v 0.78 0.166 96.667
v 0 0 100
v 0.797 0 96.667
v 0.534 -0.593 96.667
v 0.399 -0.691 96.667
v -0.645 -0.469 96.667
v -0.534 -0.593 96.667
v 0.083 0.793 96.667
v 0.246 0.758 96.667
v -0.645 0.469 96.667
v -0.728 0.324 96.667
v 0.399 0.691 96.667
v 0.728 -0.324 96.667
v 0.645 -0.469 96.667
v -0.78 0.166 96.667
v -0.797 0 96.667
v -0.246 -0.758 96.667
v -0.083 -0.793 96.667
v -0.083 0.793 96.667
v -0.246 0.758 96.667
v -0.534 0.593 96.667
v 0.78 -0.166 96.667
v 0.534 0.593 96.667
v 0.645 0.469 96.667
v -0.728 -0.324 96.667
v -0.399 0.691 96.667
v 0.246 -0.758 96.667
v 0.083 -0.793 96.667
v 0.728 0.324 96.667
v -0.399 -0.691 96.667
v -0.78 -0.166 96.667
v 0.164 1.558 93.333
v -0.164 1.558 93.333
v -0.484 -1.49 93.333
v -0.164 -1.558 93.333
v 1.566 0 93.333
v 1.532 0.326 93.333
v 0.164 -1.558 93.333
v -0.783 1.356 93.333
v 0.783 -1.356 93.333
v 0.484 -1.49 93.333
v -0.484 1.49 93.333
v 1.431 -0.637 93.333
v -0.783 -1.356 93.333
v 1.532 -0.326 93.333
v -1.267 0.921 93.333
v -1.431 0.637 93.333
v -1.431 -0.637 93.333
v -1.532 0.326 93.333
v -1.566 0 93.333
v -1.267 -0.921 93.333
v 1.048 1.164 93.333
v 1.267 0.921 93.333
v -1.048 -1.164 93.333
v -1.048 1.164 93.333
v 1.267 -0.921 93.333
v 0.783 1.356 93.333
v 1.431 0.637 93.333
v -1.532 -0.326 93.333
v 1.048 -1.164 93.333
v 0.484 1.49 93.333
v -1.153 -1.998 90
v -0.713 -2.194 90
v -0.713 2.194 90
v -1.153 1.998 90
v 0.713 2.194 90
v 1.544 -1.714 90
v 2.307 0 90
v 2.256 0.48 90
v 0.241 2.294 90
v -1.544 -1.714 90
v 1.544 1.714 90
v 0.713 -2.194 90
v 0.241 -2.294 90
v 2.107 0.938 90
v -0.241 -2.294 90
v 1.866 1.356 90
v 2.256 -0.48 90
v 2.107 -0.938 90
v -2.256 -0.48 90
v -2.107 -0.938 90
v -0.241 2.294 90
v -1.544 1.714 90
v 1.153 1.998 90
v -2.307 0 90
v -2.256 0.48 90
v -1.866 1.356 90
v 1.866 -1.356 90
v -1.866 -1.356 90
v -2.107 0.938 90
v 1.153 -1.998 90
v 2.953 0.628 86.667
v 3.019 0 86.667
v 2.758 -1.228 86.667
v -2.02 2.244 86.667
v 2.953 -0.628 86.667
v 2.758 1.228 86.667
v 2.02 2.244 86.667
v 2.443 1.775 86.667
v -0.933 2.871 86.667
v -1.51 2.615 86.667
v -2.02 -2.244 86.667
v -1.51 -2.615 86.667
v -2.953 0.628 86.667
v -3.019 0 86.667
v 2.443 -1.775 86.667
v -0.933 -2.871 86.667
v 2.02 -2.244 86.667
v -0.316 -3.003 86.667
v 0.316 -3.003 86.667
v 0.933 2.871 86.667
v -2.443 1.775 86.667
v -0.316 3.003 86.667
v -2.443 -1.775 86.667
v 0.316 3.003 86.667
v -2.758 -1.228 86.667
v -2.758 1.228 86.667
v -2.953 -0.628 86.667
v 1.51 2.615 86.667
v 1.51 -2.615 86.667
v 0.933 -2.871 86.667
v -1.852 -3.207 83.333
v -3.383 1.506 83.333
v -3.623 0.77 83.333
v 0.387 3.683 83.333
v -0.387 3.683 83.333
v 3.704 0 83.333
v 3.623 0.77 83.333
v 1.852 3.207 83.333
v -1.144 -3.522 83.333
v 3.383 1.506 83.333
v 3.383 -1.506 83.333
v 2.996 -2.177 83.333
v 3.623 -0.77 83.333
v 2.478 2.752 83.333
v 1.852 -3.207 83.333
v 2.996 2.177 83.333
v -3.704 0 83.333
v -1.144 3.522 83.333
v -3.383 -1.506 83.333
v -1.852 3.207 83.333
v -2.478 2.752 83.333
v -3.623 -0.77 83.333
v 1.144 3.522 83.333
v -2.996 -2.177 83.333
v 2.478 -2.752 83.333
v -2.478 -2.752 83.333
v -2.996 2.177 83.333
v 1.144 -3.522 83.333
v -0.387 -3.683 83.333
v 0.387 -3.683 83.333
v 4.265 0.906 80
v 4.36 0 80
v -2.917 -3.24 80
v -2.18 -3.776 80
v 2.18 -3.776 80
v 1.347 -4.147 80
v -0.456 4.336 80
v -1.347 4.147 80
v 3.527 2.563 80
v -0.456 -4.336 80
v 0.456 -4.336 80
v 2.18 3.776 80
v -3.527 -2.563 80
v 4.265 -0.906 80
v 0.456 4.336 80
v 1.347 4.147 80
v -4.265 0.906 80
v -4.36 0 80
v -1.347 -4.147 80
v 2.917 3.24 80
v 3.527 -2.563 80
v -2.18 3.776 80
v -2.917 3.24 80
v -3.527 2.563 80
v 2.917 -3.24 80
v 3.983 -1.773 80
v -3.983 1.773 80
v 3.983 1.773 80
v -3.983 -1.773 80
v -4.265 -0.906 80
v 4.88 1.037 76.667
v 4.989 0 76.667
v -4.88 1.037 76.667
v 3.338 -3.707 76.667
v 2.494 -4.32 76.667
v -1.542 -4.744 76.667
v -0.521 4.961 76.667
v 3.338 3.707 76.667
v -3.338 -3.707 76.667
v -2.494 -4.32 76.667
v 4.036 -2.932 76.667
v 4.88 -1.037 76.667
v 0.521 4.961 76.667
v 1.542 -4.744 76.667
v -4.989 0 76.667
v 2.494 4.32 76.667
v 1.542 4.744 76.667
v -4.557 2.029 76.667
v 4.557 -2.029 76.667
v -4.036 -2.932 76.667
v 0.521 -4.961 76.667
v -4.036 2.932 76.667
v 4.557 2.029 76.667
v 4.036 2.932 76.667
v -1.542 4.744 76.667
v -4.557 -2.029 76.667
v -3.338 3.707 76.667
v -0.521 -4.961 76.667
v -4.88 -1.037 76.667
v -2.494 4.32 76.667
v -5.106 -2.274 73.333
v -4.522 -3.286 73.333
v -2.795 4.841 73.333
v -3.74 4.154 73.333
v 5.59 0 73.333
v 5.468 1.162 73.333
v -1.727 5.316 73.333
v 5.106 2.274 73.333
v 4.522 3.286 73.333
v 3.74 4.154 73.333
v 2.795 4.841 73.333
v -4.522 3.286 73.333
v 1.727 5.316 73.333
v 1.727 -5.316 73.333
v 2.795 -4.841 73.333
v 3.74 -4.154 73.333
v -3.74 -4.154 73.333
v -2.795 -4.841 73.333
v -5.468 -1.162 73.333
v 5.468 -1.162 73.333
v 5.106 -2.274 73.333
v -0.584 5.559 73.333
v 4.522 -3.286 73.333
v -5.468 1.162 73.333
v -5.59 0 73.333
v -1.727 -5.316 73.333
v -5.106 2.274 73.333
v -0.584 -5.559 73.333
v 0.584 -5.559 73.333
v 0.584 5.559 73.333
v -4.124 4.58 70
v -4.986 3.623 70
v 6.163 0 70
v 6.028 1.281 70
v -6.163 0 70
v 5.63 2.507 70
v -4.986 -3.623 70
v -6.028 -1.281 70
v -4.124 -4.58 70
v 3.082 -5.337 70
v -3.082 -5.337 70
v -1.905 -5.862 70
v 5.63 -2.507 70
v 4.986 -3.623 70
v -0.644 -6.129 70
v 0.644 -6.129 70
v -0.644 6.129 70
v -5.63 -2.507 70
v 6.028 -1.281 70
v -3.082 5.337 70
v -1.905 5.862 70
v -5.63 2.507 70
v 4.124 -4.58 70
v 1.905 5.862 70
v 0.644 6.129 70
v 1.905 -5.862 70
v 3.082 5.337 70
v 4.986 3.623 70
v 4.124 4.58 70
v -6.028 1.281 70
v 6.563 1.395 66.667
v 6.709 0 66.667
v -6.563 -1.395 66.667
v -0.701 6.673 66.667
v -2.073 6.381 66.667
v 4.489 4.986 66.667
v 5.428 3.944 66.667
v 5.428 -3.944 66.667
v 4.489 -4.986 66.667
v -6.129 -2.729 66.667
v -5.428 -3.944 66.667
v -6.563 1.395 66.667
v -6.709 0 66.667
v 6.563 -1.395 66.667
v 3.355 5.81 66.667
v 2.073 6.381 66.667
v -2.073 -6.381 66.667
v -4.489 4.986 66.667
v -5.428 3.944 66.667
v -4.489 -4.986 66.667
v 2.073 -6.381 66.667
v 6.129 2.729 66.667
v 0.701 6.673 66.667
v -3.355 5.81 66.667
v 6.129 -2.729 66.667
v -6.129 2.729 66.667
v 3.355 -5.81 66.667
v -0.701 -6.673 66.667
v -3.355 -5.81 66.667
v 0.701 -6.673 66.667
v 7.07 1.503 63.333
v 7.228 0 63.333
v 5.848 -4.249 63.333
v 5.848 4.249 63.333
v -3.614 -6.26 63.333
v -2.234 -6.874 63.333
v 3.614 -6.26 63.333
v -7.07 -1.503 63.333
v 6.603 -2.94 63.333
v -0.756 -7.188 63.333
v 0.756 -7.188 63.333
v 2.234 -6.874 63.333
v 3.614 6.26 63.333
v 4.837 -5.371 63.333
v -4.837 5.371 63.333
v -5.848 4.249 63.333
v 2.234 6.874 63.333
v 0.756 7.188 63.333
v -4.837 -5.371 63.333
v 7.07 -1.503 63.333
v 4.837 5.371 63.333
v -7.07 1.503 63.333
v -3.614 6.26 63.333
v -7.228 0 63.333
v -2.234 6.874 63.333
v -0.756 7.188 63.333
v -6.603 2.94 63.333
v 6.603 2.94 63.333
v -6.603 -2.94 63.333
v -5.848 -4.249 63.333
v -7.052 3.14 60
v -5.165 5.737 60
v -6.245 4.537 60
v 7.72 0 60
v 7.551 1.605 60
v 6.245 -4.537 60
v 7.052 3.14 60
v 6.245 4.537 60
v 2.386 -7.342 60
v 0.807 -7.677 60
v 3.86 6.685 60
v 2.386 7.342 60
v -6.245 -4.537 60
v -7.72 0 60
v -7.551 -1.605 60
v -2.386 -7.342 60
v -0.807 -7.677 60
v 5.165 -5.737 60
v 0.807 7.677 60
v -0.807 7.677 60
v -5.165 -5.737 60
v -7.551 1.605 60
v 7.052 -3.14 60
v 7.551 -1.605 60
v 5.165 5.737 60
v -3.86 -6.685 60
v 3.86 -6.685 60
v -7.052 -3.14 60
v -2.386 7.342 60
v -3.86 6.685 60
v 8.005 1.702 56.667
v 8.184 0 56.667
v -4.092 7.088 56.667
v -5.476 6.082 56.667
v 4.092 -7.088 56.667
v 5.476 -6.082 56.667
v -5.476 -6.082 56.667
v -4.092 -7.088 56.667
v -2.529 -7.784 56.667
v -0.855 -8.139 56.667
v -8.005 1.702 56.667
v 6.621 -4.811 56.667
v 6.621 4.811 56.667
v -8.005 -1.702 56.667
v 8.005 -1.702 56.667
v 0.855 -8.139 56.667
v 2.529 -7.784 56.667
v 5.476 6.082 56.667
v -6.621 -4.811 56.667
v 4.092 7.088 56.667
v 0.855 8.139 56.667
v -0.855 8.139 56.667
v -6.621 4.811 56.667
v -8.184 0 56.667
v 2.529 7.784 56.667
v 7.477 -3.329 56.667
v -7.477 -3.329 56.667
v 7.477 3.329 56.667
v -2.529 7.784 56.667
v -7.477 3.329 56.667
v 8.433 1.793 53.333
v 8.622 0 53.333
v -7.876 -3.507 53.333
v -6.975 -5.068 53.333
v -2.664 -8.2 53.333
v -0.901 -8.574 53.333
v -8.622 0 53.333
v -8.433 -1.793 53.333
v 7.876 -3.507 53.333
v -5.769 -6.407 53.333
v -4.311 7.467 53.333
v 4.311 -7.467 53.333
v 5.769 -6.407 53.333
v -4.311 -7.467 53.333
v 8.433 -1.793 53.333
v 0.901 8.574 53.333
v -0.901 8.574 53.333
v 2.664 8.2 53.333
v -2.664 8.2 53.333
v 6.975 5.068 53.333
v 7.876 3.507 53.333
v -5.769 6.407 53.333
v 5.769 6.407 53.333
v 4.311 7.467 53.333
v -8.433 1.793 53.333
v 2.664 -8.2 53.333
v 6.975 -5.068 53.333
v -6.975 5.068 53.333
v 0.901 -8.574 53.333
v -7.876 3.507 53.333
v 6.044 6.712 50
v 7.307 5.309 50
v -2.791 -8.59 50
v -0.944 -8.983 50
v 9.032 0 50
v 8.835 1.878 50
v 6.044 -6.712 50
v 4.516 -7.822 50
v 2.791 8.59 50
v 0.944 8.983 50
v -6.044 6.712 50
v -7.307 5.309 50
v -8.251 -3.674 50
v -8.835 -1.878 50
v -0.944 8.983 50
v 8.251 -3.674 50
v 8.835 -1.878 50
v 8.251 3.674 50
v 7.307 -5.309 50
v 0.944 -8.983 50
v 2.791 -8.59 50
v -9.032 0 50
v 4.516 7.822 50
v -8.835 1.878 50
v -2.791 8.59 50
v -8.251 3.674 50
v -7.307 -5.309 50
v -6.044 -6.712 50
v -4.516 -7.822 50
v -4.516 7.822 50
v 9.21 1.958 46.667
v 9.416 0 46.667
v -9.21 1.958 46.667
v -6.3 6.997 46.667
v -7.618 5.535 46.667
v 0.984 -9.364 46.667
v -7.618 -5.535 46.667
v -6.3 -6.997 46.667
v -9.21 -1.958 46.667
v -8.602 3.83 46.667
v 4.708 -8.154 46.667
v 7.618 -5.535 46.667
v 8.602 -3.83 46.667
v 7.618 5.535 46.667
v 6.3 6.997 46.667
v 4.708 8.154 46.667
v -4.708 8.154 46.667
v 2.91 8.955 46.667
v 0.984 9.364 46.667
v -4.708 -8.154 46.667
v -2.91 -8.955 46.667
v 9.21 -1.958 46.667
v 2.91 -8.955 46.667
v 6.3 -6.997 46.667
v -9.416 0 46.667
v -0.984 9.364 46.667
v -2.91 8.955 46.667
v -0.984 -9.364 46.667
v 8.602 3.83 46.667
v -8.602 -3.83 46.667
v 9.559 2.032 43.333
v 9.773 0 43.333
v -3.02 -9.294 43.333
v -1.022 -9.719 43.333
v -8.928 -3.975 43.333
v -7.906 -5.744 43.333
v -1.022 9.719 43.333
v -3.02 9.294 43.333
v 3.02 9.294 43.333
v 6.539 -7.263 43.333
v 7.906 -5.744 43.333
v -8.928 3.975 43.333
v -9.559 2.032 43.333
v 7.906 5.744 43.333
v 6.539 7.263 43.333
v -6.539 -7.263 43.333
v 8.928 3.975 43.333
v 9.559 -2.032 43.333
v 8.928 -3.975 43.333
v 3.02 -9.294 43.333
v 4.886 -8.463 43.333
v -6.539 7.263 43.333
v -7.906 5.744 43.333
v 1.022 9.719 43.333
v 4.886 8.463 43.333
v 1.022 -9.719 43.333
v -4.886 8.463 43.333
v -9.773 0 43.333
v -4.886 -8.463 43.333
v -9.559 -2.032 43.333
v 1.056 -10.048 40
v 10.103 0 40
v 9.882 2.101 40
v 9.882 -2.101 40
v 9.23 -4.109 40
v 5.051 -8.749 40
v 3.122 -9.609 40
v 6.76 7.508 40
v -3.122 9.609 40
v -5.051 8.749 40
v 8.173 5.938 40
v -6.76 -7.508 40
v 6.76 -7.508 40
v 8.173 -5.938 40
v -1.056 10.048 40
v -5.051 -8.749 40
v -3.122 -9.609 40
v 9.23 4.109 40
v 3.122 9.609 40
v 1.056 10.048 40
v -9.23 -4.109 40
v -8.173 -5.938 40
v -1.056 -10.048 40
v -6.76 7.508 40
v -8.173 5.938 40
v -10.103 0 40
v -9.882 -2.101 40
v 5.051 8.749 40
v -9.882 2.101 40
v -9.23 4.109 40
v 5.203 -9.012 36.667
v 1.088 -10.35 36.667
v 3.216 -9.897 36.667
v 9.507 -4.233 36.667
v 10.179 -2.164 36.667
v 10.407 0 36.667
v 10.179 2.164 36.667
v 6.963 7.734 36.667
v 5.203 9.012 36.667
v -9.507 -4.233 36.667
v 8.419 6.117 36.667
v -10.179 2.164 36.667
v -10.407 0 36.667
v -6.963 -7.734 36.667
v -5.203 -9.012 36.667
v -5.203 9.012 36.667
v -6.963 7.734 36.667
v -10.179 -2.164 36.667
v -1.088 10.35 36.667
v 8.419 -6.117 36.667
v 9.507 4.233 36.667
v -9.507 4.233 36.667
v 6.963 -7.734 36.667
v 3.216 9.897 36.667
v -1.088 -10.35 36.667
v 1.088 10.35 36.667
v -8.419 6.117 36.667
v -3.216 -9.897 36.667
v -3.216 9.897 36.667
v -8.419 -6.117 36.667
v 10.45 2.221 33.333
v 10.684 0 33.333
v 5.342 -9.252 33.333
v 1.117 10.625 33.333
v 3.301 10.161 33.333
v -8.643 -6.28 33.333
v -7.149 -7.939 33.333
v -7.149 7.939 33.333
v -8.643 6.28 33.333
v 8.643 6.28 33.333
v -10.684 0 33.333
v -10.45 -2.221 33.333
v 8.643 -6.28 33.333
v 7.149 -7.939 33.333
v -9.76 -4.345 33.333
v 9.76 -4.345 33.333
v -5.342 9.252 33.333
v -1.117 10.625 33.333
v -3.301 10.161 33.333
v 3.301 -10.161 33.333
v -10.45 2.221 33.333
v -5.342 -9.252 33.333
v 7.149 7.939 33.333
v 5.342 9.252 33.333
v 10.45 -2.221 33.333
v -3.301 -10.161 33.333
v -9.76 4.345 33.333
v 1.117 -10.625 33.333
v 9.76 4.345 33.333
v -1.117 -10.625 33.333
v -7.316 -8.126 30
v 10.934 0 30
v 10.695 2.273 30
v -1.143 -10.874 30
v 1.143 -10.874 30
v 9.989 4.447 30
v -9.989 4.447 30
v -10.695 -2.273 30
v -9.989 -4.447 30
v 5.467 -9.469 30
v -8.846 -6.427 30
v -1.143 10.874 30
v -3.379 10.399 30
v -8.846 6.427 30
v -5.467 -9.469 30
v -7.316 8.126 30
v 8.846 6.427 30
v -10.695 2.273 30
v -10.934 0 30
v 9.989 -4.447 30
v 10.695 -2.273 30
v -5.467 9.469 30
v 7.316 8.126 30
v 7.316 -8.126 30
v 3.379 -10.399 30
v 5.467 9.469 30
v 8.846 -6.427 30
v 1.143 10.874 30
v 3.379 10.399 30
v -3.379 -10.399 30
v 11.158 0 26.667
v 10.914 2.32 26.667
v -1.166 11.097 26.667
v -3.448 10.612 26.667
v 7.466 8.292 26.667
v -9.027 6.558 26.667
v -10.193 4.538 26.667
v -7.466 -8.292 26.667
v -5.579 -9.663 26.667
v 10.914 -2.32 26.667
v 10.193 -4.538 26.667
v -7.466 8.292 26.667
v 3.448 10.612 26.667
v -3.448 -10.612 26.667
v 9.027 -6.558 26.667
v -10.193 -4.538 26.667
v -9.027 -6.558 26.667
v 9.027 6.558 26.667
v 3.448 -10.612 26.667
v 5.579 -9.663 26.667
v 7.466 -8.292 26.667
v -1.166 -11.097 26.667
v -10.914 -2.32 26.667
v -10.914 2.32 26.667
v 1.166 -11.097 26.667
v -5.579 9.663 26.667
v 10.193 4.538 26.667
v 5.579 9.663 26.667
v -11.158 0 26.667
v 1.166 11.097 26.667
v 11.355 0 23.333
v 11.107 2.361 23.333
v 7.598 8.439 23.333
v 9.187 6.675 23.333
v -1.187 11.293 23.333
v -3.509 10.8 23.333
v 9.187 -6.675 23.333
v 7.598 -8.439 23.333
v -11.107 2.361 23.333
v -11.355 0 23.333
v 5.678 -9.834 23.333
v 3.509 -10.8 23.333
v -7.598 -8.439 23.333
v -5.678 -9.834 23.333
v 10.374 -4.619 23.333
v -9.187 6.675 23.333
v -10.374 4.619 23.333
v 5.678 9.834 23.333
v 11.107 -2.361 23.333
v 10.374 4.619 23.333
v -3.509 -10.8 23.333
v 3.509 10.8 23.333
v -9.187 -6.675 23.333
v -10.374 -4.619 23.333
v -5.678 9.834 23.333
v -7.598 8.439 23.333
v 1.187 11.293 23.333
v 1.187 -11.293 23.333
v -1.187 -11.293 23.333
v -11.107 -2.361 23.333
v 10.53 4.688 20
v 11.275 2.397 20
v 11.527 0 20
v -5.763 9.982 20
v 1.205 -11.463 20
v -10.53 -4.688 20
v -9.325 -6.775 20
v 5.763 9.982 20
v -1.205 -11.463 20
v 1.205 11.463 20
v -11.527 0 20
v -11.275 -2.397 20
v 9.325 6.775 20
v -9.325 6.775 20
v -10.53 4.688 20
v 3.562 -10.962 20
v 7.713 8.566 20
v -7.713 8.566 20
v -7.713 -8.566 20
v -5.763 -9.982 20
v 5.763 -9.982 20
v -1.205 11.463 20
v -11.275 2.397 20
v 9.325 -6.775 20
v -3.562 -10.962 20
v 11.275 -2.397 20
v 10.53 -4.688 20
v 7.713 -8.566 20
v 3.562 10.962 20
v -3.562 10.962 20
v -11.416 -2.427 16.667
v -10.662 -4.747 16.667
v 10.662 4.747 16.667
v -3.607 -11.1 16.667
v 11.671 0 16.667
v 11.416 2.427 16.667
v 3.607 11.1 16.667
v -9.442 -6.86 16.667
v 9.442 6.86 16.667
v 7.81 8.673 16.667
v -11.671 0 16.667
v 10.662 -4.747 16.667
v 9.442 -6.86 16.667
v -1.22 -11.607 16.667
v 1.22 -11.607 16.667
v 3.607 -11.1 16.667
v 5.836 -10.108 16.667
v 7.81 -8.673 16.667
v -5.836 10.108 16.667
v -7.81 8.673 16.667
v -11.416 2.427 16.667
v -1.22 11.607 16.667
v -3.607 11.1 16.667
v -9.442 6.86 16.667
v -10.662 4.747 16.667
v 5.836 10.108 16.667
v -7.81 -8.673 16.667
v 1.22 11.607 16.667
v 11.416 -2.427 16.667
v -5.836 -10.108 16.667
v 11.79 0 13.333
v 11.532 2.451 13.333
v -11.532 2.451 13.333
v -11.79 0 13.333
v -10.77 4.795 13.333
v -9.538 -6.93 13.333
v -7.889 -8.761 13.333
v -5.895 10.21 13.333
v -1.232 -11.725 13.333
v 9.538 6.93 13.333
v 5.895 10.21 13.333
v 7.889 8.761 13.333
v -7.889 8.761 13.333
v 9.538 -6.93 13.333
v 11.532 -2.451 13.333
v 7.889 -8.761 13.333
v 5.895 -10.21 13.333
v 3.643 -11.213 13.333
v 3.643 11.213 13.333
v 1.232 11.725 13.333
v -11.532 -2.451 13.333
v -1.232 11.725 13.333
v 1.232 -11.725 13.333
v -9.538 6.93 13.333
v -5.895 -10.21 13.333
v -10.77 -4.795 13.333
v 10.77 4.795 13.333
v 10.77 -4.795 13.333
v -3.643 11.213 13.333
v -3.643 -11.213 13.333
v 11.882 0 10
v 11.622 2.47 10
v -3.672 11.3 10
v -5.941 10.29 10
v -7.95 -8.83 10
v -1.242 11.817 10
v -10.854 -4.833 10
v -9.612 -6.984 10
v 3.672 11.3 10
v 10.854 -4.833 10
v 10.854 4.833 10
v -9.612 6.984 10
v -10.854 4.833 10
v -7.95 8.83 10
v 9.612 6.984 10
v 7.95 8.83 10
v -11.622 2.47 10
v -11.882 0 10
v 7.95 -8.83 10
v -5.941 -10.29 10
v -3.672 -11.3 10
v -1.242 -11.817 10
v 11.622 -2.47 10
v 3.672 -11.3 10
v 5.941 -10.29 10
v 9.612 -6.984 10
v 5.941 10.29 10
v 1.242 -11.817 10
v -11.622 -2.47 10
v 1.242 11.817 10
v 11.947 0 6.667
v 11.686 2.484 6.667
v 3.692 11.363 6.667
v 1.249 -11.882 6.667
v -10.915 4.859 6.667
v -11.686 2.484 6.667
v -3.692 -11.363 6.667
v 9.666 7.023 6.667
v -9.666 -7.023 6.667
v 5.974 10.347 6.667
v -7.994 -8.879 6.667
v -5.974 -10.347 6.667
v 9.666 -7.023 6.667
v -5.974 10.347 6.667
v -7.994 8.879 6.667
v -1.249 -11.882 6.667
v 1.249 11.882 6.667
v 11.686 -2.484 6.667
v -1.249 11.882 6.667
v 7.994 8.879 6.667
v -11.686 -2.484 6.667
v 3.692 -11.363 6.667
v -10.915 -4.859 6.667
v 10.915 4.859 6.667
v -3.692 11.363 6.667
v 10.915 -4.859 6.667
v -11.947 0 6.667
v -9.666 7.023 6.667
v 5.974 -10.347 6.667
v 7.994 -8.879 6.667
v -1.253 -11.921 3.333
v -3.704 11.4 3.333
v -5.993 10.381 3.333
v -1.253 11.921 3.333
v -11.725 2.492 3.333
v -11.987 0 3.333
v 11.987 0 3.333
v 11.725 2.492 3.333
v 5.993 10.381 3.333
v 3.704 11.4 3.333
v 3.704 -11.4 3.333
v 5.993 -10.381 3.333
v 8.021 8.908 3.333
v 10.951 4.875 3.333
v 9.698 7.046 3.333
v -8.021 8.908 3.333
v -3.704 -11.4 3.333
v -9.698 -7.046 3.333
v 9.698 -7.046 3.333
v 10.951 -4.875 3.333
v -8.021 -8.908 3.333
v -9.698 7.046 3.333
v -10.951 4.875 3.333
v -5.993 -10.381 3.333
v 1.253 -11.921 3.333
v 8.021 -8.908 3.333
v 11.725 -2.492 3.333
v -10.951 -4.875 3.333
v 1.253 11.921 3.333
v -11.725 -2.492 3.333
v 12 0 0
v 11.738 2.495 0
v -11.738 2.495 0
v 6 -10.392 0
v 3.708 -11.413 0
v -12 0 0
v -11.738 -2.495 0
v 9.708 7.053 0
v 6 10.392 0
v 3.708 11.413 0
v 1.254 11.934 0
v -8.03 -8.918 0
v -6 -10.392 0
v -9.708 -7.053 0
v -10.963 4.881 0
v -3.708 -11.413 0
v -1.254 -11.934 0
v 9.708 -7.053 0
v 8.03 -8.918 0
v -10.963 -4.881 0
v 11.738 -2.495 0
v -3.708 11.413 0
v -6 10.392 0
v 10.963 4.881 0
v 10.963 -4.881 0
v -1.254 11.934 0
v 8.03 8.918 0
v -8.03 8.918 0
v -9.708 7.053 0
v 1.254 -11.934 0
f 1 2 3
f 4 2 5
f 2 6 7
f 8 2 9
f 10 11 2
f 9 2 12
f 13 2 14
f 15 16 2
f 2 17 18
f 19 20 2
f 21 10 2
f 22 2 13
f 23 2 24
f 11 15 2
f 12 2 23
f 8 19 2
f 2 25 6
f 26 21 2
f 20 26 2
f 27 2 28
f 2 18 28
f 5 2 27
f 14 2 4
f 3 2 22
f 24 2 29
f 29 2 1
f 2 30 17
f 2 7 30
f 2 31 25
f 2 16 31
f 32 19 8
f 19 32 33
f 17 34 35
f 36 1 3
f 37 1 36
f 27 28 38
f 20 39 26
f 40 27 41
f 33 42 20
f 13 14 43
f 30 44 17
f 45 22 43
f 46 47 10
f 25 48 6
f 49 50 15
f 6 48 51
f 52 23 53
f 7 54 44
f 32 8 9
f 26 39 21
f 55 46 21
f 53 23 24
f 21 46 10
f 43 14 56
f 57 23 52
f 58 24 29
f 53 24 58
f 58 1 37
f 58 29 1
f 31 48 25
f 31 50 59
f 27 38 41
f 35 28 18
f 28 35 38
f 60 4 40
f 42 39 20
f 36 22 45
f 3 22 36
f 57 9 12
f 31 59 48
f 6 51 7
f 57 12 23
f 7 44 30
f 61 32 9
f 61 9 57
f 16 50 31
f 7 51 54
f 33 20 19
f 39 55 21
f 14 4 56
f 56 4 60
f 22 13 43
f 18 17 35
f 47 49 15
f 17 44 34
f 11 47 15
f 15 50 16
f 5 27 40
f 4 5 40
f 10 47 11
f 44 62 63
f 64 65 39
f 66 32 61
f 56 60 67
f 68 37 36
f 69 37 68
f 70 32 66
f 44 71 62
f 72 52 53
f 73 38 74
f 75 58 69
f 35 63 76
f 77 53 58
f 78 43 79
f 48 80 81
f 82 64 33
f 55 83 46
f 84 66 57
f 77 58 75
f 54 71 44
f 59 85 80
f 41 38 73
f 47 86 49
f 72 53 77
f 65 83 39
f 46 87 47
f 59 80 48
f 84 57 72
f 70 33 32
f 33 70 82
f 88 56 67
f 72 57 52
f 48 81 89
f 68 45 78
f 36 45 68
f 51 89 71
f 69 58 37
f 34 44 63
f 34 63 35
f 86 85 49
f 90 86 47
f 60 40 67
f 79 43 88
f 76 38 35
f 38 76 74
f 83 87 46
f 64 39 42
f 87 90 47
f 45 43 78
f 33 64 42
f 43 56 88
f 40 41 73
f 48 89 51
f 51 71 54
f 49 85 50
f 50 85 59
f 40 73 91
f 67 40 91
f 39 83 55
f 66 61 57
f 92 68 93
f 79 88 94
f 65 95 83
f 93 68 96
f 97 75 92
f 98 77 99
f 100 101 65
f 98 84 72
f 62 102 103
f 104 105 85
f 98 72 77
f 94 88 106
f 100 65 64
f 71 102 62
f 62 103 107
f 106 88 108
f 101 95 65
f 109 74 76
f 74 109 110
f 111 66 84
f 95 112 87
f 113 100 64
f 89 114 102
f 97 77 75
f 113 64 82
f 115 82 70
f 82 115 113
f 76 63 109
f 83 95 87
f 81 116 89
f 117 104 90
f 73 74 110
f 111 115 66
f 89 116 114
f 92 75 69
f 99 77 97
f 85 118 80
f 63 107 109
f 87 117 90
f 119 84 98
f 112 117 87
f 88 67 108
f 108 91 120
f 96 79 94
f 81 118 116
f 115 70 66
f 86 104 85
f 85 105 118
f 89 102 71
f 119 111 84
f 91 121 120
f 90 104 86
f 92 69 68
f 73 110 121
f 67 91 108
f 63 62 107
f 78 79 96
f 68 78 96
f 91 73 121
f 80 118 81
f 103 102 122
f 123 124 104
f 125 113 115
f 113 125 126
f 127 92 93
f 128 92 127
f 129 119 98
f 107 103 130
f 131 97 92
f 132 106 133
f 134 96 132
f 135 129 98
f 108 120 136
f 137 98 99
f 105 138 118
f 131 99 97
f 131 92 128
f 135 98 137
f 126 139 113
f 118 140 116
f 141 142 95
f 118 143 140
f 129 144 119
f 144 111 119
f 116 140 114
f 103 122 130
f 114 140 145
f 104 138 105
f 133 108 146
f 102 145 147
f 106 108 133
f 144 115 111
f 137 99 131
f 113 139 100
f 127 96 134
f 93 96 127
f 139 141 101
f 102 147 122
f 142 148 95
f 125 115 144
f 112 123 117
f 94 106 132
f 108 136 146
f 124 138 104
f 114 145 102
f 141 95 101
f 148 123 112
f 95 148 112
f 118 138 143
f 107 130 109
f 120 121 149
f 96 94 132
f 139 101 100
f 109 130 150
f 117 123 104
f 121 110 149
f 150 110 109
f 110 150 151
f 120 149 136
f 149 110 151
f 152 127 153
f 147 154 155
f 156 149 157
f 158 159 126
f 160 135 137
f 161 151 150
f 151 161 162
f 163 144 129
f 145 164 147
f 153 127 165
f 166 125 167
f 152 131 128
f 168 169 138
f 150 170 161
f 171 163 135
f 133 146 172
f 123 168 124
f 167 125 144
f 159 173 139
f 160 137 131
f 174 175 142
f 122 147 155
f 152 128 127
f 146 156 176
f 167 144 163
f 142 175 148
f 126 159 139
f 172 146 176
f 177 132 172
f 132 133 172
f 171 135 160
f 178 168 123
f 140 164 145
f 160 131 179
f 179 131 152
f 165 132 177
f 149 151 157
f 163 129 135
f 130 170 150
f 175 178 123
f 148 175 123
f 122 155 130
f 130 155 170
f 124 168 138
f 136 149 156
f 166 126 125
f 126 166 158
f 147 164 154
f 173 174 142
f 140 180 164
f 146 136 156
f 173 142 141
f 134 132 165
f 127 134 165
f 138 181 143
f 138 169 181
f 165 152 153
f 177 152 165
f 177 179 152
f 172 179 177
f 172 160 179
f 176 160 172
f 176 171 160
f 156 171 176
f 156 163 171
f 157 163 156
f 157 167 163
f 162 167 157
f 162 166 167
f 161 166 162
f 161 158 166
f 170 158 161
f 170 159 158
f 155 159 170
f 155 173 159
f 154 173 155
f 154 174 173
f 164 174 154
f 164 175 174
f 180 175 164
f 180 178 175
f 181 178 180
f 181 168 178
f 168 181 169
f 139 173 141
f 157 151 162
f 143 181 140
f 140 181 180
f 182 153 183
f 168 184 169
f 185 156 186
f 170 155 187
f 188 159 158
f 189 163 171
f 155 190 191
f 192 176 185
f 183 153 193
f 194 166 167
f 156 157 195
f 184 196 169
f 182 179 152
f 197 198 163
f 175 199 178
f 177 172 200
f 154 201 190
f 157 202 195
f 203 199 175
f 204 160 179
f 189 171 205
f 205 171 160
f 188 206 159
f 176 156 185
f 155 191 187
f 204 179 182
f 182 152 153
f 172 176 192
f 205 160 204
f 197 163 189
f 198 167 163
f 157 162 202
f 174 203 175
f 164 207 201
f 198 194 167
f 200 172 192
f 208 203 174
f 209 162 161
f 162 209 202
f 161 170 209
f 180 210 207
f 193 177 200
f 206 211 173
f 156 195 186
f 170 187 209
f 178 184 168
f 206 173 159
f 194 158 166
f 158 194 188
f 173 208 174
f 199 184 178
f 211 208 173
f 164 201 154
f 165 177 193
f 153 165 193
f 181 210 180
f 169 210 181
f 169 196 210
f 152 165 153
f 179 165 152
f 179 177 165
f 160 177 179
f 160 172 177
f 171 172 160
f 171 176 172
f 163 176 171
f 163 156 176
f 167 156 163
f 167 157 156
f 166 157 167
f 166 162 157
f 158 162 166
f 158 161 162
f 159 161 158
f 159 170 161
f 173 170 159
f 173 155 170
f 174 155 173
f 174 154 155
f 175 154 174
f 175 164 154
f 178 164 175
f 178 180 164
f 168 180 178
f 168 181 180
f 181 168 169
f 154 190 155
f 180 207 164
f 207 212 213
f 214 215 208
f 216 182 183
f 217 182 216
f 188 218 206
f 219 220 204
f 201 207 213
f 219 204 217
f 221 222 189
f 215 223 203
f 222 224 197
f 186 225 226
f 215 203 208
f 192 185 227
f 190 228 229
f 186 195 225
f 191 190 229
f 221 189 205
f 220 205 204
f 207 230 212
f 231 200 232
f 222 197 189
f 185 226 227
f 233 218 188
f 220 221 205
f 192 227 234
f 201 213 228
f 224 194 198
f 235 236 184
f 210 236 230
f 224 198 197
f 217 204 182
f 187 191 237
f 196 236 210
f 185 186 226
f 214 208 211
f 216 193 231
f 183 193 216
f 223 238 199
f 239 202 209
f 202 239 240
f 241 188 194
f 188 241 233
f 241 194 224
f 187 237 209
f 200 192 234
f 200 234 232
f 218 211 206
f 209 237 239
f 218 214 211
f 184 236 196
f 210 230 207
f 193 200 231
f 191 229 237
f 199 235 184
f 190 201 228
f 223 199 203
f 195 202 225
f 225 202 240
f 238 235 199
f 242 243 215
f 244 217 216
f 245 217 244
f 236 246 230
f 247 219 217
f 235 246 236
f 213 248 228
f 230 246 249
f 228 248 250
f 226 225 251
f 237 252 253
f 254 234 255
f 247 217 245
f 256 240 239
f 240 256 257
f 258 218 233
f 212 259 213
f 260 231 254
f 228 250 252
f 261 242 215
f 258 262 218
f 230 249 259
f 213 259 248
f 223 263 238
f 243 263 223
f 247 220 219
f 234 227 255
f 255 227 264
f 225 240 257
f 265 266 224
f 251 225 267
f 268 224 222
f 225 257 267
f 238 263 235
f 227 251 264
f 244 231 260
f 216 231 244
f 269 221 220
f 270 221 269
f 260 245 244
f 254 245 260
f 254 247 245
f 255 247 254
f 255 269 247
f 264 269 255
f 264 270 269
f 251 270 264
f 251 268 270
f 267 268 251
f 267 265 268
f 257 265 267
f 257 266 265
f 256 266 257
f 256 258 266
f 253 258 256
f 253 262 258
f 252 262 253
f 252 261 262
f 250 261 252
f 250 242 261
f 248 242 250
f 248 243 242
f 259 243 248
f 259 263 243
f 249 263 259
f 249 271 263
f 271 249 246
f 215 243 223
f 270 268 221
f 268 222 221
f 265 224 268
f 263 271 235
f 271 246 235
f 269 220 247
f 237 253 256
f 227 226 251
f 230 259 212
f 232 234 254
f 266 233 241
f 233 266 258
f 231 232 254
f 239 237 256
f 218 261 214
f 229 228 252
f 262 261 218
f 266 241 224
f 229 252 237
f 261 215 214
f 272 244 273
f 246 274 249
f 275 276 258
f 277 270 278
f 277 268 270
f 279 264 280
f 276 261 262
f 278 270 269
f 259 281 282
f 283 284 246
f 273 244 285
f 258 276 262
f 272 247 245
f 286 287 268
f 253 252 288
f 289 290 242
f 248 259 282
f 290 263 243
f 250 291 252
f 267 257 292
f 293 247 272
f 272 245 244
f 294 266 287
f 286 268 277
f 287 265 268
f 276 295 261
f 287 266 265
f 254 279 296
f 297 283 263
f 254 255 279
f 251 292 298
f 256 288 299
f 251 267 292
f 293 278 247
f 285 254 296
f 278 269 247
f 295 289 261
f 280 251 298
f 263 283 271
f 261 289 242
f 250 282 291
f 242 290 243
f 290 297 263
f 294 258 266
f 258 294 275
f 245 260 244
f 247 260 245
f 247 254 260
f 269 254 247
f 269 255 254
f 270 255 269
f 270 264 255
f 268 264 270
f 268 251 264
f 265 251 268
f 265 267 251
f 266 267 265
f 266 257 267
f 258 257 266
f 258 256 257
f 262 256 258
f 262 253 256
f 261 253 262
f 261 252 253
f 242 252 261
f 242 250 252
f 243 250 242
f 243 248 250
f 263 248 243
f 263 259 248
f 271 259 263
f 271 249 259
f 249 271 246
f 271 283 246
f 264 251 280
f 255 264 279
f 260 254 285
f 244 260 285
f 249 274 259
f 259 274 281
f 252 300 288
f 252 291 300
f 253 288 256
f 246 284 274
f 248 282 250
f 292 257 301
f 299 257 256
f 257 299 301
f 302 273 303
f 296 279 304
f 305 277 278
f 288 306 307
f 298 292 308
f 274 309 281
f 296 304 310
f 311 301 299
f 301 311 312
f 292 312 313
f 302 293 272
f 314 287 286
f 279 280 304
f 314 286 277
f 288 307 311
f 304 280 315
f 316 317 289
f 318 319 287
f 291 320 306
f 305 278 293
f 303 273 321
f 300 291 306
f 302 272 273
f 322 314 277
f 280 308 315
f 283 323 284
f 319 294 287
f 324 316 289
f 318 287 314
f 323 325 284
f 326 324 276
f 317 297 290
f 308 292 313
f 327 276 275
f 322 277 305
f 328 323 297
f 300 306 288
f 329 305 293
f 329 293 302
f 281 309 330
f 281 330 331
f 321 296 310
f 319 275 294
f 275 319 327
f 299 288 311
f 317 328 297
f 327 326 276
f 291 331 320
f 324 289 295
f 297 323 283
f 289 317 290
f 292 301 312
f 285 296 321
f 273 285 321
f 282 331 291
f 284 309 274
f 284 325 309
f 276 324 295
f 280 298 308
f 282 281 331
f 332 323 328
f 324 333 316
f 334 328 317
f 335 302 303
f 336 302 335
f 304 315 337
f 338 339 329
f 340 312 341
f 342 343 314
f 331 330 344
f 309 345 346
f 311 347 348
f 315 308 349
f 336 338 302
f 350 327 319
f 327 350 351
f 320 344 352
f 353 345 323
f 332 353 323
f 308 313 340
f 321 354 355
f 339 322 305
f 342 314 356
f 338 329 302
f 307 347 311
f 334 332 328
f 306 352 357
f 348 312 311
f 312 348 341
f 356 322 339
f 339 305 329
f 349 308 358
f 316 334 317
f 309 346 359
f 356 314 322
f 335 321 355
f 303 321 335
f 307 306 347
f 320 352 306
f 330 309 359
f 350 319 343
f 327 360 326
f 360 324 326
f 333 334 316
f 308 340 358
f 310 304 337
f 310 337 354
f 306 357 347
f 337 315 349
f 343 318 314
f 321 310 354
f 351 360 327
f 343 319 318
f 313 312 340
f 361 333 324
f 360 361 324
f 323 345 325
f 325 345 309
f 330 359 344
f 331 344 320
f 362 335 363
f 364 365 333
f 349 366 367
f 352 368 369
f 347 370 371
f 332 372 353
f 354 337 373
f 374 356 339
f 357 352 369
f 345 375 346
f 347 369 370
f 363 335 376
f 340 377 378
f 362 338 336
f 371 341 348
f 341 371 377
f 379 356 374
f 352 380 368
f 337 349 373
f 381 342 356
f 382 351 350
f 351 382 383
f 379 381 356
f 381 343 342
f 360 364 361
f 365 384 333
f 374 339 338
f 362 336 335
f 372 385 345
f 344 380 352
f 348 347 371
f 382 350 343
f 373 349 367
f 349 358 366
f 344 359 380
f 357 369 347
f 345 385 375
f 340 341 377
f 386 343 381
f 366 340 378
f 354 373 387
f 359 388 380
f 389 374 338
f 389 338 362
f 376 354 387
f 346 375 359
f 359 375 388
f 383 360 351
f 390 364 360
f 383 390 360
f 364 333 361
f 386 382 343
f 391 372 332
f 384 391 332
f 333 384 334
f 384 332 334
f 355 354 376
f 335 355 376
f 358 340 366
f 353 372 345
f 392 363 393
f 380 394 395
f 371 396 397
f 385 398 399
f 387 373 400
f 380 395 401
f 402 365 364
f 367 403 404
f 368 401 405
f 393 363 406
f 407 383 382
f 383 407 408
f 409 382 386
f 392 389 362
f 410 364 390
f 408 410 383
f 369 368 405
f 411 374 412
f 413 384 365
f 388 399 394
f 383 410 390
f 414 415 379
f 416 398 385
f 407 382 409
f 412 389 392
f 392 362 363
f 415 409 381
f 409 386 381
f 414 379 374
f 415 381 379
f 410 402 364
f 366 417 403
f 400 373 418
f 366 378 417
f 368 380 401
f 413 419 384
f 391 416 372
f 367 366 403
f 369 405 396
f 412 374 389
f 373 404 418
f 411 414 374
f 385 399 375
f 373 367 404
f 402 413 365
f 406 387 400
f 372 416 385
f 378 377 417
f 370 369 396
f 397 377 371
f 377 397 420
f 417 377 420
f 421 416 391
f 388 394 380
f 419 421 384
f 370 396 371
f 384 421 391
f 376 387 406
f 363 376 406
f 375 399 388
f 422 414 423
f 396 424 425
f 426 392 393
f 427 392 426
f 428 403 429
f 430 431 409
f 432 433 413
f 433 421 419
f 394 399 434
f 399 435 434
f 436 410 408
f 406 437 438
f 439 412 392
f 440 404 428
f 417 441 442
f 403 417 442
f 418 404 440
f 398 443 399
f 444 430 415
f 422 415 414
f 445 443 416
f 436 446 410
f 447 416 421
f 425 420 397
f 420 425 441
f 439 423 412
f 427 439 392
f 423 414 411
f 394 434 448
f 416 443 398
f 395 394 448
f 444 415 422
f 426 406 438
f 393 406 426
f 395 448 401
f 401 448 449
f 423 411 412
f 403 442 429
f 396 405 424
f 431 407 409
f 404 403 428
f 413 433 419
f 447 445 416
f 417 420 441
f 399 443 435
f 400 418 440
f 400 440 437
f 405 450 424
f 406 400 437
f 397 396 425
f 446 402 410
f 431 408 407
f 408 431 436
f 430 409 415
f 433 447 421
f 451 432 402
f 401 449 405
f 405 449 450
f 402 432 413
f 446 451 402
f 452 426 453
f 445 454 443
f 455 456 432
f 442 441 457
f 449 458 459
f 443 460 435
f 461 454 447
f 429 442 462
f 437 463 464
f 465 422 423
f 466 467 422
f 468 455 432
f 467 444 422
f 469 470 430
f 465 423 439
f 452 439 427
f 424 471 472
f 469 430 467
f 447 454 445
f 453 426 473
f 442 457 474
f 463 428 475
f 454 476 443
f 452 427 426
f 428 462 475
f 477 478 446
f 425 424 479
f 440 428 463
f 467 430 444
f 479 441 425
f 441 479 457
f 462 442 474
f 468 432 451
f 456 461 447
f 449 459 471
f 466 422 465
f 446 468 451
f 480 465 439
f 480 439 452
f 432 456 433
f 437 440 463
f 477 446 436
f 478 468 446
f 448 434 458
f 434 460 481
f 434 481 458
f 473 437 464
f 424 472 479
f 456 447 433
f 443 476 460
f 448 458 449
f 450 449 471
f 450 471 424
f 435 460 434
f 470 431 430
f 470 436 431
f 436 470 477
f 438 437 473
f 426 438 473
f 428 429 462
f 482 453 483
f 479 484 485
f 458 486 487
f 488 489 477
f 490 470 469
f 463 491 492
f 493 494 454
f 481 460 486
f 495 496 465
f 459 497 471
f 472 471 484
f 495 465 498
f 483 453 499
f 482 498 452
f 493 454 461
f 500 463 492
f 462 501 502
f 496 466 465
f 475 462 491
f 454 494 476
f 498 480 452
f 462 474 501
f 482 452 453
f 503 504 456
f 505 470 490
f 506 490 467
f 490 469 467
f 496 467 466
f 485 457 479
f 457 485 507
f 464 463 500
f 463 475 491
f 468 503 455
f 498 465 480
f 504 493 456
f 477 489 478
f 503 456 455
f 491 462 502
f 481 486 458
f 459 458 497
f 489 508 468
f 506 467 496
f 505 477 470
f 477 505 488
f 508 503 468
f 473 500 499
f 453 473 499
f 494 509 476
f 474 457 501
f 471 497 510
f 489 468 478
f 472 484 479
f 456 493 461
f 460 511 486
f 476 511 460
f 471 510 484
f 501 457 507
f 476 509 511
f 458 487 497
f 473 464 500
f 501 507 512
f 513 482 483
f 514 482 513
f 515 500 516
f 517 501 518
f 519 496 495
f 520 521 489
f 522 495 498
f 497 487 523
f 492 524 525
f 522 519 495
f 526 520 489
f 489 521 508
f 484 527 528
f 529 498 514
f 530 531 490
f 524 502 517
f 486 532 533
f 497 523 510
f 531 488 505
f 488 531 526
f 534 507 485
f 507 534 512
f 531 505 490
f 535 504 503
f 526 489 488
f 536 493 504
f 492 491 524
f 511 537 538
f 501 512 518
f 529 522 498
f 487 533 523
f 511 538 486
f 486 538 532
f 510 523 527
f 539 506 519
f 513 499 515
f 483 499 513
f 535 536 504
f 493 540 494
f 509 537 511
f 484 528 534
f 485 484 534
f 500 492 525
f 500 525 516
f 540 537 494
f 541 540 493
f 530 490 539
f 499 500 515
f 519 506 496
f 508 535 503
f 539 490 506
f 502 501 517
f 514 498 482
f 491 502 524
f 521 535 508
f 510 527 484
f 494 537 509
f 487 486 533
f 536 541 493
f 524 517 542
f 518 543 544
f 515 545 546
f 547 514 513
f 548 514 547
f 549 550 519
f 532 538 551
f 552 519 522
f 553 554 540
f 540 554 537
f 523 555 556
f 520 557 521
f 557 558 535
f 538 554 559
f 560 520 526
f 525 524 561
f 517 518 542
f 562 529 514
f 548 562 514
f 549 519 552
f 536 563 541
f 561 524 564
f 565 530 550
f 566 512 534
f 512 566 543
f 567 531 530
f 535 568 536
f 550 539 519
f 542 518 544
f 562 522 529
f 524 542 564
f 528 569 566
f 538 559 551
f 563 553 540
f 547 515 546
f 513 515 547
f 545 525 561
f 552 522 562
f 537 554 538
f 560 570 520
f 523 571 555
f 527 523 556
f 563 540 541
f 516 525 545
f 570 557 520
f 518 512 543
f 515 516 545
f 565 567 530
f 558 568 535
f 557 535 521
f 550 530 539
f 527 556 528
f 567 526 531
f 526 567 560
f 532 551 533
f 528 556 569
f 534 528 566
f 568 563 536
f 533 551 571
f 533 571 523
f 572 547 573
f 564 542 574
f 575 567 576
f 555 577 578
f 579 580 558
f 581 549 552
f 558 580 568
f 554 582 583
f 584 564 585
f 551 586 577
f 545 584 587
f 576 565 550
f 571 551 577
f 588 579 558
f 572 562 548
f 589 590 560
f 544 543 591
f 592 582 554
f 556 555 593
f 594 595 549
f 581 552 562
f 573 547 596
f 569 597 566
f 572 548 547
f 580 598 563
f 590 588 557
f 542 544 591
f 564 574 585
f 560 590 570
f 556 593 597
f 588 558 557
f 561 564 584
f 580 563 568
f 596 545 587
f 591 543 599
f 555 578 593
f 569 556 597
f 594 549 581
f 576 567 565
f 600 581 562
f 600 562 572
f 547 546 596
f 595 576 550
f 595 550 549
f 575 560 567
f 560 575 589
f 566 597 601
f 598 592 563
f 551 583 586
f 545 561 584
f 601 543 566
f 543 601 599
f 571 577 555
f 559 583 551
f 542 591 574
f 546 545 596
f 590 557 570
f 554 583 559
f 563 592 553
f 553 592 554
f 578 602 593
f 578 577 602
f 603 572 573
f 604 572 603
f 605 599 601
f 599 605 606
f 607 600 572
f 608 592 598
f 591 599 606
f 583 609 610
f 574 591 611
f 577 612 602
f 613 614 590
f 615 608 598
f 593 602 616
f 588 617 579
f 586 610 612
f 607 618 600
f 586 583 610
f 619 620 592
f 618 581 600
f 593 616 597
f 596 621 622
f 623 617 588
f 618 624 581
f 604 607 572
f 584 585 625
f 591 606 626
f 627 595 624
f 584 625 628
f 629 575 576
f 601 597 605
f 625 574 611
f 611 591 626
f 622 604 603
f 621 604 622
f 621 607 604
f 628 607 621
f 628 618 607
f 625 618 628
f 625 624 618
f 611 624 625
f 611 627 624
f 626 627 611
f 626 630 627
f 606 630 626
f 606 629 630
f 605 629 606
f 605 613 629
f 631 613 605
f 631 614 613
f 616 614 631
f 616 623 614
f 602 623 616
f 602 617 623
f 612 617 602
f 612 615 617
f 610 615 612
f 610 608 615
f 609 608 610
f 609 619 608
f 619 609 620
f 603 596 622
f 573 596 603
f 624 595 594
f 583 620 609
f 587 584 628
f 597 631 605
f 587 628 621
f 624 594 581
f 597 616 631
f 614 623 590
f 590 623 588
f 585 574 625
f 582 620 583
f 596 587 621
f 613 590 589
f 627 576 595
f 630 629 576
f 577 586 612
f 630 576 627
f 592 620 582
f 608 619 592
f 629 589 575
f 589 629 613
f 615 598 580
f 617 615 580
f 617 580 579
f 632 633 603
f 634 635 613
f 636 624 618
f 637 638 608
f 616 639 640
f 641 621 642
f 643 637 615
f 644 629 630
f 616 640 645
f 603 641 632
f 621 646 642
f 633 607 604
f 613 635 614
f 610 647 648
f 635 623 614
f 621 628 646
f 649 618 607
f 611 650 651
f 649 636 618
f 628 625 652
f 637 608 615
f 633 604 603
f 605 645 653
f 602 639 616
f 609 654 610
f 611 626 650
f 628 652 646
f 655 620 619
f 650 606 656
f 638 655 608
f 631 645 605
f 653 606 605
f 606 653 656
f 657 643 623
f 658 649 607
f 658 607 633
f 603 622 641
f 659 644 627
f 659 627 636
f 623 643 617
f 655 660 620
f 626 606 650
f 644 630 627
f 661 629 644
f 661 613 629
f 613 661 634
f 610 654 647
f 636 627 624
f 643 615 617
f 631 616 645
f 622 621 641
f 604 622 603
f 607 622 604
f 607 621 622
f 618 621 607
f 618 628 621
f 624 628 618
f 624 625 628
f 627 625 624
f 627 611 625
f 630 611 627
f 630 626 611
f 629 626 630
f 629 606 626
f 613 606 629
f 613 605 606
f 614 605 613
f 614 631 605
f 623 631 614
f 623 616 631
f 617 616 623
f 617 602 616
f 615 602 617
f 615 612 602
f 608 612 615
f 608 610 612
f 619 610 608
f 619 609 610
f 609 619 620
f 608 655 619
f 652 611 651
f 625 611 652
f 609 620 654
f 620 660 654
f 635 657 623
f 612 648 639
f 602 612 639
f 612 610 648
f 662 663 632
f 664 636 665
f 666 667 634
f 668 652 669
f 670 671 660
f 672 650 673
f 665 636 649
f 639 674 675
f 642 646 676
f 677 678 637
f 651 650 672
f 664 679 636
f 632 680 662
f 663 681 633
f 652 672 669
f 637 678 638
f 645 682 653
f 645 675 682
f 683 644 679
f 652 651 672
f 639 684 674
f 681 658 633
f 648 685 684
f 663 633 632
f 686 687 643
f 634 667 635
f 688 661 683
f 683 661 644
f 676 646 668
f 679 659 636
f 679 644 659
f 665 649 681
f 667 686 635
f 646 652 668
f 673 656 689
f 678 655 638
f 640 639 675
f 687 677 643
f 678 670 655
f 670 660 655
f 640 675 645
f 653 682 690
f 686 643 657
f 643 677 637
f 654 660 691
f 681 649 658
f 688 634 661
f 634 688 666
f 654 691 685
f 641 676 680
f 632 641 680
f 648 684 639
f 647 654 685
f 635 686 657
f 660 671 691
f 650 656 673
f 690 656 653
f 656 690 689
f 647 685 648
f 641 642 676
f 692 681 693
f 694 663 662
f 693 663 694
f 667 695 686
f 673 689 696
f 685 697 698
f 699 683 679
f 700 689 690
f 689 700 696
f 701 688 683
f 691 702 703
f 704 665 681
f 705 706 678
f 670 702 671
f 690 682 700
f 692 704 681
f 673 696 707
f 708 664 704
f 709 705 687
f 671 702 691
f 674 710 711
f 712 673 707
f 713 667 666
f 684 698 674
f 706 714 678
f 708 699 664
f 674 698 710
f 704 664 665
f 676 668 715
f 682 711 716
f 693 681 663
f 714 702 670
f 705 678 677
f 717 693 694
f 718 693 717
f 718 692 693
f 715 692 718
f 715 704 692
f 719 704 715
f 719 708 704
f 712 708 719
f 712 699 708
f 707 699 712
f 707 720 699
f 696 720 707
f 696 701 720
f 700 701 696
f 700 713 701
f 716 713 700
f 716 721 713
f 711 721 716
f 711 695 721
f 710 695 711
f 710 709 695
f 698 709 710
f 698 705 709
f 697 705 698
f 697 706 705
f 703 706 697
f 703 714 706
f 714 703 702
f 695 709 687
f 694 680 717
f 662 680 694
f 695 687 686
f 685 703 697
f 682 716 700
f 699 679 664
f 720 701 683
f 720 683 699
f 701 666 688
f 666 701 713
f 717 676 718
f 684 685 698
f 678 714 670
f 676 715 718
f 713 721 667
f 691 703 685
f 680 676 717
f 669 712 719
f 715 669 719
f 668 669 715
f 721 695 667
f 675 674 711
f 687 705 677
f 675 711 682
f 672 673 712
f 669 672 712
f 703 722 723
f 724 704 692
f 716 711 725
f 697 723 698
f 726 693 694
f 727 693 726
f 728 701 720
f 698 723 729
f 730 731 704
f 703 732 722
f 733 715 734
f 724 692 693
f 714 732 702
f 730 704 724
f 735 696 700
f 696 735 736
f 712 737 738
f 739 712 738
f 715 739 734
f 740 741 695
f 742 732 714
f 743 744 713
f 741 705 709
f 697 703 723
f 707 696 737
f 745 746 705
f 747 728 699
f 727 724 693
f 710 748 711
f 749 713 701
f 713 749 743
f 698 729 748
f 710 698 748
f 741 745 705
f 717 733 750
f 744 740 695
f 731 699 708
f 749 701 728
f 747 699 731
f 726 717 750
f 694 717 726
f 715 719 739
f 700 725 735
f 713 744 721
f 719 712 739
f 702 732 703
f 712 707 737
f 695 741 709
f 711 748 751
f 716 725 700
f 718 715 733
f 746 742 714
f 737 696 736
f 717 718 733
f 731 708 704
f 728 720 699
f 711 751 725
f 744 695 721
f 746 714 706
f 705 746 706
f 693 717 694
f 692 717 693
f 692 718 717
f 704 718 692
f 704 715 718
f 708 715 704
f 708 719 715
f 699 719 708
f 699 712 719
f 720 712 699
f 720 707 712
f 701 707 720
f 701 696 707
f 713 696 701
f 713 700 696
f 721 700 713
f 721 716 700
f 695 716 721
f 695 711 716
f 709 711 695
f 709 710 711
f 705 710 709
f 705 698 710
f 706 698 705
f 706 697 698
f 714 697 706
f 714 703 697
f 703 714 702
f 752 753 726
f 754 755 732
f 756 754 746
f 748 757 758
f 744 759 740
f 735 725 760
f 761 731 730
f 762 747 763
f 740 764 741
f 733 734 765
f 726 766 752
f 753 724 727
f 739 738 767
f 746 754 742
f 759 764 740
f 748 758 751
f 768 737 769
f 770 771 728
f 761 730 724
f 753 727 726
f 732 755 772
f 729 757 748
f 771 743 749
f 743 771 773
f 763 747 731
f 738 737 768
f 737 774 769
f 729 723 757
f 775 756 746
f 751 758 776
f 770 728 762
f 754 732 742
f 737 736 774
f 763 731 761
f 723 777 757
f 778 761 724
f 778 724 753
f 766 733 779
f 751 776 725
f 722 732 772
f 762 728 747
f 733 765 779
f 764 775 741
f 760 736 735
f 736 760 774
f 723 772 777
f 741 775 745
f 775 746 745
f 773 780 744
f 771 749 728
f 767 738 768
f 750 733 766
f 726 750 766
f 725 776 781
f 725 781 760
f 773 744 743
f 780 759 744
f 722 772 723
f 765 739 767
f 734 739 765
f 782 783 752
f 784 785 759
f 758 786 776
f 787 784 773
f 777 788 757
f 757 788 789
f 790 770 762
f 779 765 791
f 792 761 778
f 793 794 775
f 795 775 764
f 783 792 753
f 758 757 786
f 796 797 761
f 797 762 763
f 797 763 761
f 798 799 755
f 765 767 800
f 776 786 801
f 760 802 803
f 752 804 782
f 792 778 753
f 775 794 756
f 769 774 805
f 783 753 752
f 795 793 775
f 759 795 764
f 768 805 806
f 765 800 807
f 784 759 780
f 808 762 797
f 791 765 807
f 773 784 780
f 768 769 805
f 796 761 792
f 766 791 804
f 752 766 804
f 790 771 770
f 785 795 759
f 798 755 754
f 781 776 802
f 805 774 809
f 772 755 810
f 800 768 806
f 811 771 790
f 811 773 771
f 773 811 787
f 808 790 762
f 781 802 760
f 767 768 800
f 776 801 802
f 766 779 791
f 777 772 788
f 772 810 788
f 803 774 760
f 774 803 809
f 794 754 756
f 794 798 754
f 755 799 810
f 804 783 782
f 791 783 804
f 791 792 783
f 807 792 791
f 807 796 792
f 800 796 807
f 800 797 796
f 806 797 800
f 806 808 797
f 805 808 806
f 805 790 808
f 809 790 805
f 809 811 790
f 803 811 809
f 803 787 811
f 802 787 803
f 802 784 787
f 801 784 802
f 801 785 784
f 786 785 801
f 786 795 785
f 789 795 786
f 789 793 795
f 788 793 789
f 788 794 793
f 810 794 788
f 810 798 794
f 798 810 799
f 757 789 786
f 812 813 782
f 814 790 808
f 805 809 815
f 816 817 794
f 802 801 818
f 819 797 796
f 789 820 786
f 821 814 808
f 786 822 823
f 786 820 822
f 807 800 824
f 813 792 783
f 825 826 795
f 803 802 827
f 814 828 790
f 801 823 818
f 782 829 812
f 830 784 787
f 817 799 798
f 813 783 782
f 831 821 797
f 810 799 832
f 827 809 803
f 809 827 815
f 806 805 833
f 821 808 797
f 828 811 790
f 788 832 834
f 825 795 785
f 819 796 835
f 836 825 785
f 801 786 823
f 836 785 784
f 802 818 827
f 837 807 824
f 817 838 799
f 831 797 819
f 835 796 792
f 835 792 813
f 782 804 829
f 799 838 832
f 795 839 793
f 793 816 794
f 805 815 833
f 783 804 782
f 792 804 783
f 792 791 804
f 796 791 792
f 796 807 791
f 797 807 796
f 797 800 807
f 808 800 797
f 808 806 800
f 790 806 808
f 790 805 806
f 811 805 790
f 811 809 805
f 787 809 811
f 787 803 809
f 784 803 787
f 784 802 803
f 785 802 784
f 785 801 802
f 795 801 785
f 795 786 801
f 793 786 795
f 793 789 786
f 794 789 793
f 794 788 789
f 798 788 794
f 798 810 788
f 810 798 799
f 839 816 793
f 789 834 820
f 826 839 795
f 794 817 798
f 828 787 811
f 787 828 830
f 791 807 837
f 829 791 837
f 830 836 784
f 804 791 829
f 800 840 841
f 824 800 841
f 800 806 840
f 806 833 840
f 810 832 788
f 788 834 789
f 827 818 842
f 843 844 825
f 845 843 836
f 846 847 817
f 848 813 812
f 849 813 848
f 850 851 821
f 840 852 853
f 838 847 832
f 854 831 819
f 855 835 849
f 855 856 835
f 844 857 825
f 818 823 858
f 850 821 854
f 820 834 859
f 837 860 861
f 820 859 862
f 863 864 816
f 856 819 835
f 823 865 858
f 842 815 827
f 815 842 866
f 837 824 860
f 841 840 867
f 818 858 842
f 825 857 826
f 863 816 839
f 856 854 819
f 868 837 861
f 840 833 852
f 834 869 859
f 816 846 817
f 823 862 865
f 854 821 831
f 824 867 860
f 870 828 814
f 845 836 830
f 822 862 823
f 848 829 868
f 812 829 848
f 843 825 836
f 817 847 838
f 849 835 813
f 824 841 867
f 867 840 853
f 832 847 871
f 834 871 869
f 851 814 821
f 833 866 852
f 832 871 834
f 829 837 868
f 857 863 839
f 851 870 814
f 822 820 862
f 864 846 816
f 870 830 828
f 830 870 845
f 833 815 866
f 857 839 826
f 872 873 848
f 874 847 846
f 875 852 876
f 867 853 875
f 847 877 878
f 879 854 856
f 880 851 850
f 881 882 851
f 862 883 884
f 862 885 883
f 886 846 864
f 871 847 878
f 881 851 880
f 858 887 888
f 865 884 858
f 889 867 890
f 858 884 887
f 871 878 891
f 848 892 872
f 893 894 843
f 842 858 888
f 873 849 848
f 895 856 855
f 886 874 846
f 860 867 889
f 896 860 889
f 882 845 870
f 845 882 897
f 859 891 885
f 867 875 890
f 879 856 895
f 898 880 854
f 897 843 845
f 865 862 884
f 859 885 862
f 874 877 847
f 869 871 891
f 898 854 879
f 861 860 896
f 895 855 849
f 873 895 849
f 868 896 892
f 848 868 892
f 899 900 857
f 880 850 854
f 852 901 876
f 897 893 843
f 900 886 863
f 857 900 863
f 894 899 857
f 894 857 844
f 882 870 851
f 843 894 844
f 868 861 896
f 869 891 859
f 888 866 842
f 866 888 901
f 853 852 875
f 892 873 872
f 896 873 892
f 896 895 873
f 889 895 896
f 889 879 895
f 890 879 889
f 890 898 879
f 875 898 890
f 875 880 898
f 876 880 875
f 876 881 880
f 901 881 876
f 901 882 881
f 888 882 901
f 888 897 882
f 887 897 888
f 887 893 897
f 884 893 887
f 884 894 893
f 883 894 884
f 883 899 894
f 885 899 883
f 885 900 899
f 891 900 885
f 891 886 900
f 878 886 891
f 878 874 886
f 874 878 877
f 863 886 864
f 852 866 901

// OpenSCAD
/* tangent ogive */

/* 
phi = (R^2+ L^2)/ 2R

y= sqrt(phi^2 - (L -x)^2) + R -phi

*/

L= 100;
R=24/2;
nof = 30;


phi = (pow(R,2) + pow(L,2))/ (2*R); 

$fn=30;
H2=L/nof;
x1= 0;
x2=0;
A1=0;
A2= 0;
module ogive()
{

	for (i=[1:nof]) {

assign(x1 = ((L/nof)*(i-1)),
x2 = ((L/nof)*i),
A1= sqrt(pow(phi,2) - pow((L - ((L/nof)*(i-1))), 2) ) + (R - phi),
A2= sqrt(pow(phi,2) - pow((L - ((L/nof)*i)), 2) ) + (R - phi),
H1= (L/nof)*i)
		{
	  translate ([0,0, L- H1]) cylinder (r1 = A2, r2 = A1 , h= H2);
		echo("i=", i ,"h=",H1,"r1:",A1,"r2:", A2, "phi:", phi, "x1:", x1, "x2", x2);
		}
	}
}

ogive();
